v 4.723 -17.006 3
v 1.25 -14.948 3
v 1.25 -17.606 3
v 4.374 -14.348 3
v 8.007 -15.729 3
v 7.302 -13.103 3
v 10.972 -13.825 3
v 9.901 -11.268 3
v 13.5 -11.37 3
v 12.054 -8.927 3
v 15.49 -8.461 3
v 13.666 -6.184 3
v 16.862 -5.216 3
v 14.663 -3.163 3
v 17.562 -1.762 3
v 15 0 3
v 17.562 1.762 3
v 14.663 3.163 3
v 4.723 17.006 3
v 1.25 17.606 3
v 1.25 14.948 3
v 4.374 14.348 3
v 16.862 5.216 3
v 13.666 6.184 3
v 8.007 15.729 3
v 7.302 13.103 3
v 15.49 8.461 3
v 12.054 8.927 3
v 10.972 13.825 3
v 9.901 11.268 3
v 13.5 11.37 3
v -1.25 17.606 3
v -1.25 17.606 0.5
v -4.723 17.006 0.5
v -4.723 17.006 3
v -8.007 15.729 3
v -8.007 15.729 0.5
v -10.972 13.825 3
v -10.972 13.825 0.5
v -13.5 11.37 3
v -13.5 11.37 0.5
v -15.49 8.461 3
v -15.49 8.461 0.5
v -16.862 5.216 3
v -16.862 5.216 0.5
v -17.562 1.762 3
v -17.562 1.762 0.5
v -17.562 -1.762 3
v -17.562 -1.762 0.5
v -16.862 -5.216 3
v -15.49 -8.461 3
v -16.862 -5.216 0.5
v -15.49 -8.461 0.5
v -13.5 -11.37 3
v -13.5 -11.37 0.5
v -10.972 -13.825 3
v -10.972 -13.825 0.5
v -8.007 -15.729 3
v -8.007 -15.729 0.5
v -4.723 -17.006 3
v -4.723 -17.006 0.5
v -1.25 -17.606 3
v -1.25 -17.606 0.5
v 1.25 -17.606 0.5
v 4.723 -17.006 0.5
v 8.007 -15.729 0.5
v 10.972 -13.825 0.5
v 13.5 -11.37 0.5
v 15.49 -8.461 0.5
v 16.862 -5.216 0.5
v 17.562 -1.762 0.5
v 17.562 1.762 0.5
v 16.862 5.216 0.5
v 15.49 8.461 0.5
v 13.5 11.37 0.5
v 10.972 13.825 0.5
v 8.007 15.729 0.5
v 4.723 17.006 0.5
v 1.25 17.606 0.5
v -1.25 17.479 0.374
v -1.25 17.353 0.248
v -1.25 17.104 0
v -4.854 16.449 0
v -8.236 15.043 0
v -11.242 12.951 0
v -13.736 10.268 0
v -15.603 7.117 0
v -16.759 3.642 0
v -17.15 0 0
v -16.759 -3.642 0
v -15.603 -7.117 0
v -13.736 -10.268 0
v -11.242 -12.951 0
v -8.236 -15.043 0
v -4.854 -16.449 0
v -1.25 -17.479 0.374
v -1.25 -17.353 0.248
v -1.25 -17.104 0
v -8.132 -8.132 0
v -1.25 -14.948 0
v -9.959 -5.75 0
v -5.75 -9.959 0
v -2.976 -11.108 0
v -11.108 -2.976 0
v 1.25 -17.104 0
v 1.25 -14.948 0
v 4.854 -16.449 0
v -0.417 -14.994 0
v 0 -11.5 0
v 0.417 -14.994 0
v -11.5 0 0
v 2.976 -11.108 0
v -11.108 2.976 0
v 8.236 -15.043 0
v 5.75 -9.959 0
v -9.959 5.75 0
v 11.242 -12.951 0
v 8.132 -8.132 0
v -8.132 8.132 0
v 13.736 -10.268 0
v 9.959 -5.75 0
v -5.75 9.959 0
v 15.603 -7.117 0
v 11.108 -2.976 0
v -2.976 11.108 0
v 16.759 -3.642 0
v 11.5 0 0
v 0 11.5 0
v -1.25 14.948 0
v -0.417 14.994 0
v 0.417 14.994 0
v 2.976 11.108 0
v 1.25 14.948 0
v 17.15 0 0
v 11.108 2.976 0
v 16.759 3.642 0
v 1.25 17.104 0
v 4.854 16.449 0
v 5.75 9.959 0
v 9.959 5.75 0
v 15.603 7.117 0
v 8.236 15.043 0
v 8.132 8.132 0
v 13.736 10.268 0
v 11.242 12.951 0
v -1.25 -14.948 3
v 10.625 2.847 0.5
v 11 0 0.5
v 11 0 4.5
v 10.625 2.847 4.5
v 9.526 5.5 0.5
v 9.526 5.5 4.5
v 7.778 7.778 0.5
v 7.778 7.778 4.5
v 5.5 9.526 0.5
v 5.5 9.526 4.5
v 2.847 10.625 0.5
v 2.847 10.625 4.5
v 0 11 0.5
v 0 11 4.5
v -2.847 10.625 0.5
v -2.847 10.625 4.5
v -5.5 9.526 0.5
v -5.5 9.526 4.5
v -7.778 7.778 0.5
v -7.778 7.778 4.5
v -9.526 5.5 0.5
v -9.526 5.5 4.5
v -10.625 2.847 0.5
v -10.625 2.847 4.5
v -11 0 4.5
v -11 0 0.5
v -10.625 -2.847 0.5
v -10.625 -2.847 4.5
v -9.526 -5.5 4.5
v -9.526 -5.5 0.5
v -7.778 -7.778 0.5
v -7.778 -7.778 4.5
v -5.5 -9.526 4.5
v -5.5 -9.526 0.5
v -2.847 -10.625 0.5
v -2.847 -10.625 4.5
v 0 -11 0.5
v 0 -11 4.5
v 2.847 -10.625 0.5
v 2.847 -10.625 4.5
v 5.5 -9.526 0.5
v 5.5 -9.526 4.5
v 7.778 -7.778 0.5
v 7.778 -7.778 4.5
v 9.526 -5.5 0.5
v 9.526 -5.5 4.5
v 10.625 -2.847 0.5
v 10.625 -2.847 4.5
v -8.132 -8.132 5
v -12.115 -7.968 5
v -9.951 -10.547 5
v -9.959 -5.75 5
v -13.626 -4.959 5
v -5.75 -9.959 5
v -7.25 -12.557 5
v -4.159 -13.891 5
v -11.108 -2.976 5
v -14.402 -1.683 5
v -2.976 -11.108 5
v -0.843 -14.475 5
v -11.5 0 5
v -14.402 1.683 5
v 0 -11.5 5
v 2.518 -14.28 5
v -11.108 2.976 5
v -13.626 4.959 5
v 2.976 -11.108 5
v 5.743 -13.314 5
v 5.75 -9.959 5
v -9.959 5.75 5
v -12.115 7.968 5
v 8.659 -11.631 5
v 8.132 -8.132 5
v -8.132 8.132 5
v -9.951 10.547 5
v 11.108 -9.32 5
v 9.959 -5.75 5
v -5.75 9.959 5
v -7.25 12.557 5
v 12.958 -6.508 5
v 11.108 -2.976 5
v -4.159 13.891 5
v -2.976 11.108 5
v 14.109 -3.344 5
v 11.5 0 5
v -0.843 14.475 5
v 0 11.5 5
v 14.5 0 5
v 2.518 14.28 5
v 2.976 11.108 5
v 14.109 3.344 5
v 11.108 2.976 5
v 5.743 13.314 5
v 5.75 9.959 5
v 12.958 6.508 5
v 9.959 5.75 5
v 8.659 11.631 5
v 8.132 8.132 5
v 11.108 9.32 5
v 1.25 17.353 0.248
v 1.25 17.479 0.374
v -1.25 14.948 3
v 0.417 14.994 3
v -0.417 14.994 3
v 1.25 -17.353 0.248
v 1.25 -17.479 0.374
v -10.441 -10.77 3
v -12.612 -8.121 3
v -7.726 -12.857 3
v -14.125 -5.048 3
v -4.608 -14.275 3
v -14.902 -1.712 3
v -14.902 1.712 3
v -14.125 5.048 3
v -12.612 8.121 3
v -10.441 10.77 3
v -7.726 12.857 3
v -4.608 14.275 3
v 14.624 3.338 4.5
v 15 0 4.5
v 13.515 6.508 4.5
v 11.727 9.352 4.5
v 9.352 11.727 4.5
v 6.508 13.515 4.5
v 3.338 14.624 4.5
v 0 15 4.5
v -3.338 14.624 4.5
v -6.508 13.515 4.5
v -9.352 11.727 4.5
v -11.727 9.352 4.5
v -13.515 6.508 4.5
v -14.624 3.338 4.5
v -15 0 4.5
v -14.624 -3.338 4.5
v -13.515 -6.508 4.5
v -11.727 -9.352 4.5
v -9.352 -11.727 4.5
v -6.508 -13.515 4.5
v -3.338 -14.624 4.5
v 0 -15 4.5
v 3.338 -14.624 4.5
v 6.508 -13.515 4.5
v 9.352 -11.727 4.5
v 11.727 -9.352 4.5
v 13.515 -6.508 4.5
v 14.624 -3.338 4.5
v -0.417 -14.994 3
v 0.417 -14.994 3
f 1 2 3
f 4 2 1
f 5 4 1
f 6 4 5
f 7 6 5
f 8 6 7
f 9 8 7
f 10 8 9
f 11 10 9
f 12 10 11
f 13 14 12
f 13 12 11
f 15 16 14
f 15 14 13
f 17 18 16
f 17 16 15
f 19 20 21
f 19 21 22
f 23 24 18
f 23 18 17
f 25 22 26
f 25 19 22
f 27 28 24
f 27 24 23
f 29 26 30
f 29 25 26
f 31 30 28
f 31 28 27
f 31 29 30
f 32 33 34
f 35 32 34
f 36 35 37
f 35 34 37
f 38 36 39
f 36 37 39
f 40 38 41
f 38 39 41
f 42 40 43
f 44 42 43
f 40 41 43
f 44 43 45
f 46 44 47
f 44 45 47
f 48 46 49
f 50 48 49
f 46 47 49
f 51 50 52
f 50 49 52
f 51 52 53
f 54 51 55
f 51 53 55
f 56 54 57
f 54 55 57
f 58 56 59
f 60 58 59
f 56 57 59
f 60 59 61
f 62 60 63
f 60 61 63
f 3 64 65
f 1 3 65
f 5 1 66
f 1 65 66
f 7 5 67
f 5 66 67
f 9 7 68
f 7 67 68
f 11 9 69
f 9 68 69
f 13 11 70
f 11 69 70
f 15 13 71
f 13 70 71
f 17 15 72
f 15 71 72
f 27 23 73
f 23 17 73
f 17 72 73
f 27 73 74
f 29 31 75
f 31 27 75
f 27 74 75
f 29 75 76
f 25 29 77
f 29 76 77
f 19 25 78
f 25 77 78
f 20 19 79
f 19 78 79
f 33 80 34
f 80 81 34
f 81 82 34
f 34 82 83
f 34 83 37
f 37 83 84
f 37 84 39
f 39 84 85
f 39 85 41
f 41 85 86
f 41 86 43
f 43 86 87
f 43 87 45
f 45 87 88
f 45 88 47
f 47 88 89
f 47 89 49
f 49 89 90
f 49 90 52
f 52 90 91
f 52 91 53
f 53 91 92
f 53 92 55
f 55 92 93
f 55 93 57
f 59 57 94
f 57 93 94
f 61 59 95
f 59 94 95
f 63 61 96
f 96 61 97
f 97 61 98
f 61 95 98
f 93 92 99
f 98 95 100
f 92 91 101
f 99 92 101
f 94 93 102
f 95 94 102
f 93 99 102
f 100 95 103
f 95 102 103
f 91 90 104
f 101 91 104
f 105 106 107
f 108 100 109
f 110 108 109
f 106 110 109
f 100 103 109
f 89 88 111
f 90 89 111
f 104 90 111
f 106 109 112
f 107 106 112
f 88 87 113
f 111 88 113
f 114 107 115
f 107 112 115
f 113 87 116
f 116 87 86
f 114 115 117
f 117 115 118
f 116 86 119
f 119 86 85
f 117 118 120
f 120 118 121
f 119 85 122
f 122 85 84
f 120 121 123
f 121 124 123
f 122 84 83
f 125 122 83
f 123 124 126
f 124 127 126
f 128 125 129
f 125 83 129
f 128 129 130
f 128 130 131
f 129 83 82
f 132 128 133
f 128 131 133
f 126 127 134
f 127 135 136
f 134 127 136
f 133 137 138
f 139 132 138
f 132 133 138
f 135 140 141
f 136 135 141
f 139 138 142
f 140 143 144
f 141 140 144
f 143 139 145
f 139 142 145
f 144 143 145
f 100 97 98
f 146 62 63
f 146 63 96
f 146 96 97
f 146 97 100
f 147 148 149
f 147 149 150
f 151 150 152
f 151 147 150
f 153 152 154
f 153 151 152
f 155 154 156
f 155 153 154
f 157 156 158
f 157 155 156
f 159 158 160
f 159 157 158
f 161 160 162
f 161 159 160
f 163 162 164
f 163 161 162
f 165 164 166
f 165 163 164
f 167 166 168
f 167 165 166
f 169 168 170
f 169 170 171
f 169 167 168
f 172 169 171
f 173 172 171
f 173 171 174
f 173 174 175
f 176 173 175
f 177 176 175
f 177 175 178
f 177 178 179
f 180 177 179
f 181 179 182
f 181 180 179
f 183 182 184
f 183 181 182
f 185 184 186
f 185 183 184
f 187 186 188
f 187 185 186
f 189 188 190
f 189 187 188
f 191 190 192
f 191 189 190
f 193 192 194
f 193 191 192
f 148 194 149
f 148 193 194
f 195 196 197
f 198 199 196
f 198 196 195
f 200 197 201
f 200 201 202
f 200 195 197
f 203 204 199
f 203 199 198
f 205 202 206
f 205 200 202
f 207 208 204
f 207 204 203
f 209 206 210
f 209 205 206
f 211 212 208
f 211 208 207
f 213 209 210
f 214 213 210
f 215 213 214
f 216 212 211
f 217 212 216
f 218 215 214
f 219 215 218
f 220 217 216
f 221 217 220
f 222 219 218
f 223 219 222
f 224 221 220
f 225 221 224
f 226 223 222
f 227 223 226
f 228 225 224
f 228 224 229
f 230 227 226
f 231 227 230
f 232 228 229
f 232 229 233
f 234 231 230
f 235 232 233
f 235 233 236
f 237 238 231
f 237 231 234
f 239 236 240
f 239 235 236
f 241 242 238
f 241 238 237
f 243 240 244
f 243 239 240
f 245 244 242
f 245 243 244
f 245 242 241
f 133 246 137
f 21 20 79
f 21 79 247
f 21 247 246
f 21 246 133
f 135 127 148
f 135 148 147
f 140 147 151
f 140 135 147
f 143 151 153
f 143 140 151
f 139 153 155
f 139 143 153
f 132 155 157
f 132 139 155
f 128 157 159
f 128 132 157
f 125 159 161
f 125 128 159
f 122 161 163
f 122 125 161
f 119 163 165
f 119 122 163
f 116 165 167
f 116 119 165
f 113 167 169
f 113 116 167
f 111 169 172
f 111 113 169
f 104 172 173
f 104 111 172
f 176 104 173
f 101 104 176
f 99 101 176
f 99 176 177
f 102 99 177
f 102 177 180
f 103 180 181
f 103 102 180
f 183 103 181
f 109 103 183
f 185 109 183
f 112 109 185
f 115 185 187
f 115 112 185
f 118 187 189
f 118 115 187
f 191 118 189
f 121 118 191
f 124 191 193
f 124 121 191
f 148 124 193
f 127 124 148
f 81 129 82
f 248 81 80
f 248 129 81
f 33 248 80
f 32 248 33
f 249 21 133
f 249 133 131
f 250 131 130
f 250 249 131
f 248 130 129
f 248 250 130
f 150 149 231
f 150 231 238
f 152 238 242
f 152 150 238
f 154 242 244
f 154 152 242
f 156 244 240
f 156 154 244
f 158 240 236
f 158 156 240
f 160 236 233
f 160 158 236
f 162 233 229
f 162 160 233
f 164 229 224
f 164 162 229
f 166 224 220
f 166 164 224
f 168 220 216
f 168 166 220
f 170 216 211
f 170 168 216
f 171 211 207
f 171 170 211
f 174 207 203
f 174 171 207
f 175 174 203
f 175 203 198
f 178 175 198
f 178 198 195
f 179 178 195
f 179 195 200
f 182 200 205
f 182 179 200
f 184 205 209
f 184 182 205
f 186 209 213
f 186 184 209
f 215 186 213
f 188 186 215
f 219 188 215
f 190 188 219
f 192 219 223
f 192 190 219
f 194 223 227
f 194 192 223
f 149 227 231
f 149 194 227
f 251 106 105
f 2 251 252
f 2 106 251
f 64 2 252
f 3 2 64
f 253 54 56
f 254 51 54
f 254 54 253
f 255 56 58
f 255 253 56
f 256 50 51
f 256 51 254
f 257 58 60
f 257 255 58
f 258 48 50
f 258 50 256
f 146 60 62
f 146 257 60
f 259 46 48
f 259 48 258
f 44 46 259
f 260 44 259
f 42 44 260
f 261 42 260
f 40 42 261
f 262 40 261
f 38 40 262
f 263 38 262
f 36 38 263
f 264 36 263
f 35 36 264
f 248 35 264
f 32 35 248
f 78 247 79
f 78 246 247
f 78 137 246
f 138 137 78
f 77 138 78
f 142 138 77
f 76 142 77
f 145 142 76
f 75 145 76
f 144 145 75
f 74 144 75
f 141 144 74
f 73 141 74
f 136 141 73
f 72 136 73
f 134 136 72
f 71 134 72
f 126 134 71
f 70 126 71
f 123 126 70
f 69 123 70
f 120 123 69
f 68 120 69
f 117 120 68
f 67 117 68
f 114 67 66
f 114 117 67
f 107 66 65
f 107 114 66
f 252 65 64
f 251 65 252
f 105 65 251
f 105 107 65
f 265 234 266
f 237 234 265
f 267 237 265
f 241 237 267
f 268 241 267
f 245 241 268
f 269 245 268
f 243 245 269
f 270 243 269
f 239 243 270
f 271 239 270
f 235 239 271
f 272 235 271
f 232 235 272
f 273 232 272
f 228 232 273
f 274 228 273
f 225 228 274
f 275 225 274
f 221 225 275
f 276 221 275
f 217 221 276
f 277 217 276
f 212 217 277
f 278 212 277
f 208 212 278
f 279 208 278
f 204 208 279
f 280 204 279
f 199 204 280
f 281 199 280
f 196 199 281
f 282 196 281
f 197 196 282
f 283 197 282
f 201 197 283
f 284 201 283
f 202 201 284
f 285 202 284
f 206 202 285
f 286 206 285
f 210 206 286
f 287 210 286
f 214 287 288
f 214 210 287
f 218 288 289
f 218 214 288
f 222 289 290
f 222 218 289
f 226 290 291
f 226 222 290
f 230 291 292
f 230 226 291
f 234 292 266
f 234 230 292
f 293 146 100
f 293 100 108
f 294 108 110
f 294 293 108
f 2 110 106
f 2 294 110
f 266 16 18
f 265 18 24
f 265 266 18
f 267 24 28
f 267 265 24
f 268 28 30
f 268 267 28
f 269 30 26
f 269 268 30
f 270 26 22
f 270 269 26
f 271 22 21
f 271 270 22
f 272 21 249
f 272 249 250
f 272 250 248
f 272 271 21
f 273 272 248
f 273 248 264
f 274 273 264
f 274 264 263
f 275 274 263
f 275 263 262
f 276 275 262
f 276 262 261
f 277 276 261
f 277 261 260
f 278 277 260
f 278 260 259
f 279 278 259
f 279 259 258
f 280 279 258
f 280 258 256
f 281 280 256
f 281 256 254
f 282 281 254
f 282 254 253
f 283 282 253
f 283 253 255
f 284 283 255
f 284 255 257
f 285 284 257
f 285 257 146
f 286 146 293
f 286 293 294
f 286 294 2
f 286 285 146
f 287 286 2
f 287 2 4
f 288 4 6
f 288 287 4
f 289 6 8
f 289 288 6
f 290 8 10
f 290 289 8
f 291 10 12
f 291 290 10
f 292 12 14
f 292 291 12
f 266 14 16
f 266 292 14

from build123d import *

# Parameters (mm, degrees)
SKETCH1_R           = 17.65
SKETCH1_R_2         = 11
BOSS_EXTRUDE1_DEPTH = 5
SKETCH2_R           = 17.65
SKETCH2_R_2         = 15
CUT_EXTRUDE1_DEPTH  = 2
CUT_EXTRUDE3_REACH  = 5
CHAMFER1_SIZE       = 0.5


with BuildPart() as part:
    # Sketch1 → Boss-Extrude1 (new body)
    with BuildSketch(Plane.XY):
        Circle(SKETCH1_R)
        Circle(SKETCH1_R_2, mode=Mode.SUBTRACT)
    extrude(amount=BOSS_EXTRUDE1_DEPTH)

    # Sketch2 → Cut-Extrude1 (cut)
    with BuildSketch(Plane.XY.offset(5)):
        Circle(SKETCH2_R)
        Circle(SKETCH2_R_2, mode=Mode.SUBTRACT)
    extrude(amount=-CUT_EXTRUDE1_DEPTH, mode=Mode.SUBTRACT)

    # Sketch3 → Cut-Extrude3 (cut, up to next)
    with BuildSketch(Plane.XY.offset(3), mode=Mode.PRIVATE) as cut_extrude3_sk1:
        with BuildLine():
            Line((1.25, 17.605680901), (1.25, 14.947825929))
            ThreePointArc((1.25, 14.947825929), (0, 15), (-1.25, 14.947825929))
            Line((-1.25, 14.947825929), (-1.25, 17.605680901))
            ThreePointArc((-1.25, 17.605680901), (0, 17.65), (1.25, 17.605680901))
        make_face()
    cut_extrude3_tool1 = extrude(cut_extrude3_sk1.sketch, amount=-CUT_EXTRUDE3_REACH, mode=Mode.PRIVATE) & part.part
    add(cut_extrude3_tool1.solids().sort_by_distance((0, 16.308915, 3))[0], mode=Mode.SUBTRACT)
    # Sketch3 → Cut-Extrude3 (cut, up to next)
    with BuildSketch(Plane.XY.offset(3), mode=Mode.PRIVATE) as cut_extrude3_sk2:
        with BuildLine():
            Line((1.25, -14.947825929), (1.25, -17.605680901))
            ThreePointArc((1.25, -17.605680901), (0, -17.65), (-1.25, -17.605680901))
            Line((-1.25, -17.605680901), (-1.25, -14.947825929))
            ThreePointArc((-1.25, -14.947825929), (0, -15), (1.25, -14.947825929))
        make_face()
    cut_extrude3_tool2 = extrude(cut_extrude3_sk2.sketch, amount=-CUT_EXTRUDE3_REACH, mode=Mode.PRIVATE) & part.part
    add(cut_extrude3_tool2.solids().sort_by_distance((0, -16.308915, 3))[0], mode=Mode.SUBTRACT)

    # Chamfer1
    chamfer1_edges = [part.edges().sort_by_distance(p)[0] for p in [
        (-15, 0, 5),
        (-17.65, 0, 0),
        (17.65, 0, 0),
        (-11, 0, 0),
        (-11, 0, 5),
    ]]
    chamfer(chamfer1_edges, length=CHAMFER1_SIZE)


solid = part.part
